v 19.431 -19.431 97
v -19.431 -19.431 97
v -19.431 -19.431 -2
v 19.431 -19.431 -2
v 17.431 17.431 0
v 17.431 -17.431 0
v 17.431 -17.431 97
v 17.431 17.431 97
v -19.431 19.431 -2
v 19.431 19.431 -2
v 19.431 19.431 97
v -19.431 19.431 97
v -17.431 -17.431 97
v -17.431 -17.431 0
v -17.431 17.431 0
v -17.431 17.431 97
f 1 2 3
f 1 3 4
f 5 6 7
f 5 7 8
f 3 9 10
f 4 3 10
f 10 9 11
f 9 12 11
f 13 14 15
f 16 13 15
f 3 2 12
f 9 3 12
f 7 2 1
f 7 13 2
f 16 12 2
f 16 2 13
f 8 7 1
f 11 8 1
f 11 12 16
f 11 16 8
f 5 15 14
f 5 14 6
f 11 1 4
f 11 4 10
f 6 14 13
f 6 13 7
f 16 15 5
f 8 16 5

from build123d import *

# Parameters (mm, degrees)
F0_W     = 38.862
F0_H     = 38.862
F0_W_2   = 34.862
F0_H_2   = 34.862
F1_DEPTH = 97
F2_DEPTH = 2


with BuildPart() as f1:
    # F0 (on Top) → F1 (new body)
    with BuildSketch(Plane.XY):
        Rectangle(F0_W, F0_H)
        Rectangle(F0_W_2, F0_H_2, mode=Mode.SUBTRACT)
    extrude(amount=F1_DEPTH)

    # F0 (on Top) → F2 (join)
    with BuildSketch(Plane.XY):
        Rectangle(F0_W, F0_H)
        Rectangle(F0_W_2, F0_H_2, mode=Mode.SUBTRACT)
        Rectangle(F0_W_2, F0_H_2)
    extrude(amount=-F2_DEPTH)


solid = f1.part
